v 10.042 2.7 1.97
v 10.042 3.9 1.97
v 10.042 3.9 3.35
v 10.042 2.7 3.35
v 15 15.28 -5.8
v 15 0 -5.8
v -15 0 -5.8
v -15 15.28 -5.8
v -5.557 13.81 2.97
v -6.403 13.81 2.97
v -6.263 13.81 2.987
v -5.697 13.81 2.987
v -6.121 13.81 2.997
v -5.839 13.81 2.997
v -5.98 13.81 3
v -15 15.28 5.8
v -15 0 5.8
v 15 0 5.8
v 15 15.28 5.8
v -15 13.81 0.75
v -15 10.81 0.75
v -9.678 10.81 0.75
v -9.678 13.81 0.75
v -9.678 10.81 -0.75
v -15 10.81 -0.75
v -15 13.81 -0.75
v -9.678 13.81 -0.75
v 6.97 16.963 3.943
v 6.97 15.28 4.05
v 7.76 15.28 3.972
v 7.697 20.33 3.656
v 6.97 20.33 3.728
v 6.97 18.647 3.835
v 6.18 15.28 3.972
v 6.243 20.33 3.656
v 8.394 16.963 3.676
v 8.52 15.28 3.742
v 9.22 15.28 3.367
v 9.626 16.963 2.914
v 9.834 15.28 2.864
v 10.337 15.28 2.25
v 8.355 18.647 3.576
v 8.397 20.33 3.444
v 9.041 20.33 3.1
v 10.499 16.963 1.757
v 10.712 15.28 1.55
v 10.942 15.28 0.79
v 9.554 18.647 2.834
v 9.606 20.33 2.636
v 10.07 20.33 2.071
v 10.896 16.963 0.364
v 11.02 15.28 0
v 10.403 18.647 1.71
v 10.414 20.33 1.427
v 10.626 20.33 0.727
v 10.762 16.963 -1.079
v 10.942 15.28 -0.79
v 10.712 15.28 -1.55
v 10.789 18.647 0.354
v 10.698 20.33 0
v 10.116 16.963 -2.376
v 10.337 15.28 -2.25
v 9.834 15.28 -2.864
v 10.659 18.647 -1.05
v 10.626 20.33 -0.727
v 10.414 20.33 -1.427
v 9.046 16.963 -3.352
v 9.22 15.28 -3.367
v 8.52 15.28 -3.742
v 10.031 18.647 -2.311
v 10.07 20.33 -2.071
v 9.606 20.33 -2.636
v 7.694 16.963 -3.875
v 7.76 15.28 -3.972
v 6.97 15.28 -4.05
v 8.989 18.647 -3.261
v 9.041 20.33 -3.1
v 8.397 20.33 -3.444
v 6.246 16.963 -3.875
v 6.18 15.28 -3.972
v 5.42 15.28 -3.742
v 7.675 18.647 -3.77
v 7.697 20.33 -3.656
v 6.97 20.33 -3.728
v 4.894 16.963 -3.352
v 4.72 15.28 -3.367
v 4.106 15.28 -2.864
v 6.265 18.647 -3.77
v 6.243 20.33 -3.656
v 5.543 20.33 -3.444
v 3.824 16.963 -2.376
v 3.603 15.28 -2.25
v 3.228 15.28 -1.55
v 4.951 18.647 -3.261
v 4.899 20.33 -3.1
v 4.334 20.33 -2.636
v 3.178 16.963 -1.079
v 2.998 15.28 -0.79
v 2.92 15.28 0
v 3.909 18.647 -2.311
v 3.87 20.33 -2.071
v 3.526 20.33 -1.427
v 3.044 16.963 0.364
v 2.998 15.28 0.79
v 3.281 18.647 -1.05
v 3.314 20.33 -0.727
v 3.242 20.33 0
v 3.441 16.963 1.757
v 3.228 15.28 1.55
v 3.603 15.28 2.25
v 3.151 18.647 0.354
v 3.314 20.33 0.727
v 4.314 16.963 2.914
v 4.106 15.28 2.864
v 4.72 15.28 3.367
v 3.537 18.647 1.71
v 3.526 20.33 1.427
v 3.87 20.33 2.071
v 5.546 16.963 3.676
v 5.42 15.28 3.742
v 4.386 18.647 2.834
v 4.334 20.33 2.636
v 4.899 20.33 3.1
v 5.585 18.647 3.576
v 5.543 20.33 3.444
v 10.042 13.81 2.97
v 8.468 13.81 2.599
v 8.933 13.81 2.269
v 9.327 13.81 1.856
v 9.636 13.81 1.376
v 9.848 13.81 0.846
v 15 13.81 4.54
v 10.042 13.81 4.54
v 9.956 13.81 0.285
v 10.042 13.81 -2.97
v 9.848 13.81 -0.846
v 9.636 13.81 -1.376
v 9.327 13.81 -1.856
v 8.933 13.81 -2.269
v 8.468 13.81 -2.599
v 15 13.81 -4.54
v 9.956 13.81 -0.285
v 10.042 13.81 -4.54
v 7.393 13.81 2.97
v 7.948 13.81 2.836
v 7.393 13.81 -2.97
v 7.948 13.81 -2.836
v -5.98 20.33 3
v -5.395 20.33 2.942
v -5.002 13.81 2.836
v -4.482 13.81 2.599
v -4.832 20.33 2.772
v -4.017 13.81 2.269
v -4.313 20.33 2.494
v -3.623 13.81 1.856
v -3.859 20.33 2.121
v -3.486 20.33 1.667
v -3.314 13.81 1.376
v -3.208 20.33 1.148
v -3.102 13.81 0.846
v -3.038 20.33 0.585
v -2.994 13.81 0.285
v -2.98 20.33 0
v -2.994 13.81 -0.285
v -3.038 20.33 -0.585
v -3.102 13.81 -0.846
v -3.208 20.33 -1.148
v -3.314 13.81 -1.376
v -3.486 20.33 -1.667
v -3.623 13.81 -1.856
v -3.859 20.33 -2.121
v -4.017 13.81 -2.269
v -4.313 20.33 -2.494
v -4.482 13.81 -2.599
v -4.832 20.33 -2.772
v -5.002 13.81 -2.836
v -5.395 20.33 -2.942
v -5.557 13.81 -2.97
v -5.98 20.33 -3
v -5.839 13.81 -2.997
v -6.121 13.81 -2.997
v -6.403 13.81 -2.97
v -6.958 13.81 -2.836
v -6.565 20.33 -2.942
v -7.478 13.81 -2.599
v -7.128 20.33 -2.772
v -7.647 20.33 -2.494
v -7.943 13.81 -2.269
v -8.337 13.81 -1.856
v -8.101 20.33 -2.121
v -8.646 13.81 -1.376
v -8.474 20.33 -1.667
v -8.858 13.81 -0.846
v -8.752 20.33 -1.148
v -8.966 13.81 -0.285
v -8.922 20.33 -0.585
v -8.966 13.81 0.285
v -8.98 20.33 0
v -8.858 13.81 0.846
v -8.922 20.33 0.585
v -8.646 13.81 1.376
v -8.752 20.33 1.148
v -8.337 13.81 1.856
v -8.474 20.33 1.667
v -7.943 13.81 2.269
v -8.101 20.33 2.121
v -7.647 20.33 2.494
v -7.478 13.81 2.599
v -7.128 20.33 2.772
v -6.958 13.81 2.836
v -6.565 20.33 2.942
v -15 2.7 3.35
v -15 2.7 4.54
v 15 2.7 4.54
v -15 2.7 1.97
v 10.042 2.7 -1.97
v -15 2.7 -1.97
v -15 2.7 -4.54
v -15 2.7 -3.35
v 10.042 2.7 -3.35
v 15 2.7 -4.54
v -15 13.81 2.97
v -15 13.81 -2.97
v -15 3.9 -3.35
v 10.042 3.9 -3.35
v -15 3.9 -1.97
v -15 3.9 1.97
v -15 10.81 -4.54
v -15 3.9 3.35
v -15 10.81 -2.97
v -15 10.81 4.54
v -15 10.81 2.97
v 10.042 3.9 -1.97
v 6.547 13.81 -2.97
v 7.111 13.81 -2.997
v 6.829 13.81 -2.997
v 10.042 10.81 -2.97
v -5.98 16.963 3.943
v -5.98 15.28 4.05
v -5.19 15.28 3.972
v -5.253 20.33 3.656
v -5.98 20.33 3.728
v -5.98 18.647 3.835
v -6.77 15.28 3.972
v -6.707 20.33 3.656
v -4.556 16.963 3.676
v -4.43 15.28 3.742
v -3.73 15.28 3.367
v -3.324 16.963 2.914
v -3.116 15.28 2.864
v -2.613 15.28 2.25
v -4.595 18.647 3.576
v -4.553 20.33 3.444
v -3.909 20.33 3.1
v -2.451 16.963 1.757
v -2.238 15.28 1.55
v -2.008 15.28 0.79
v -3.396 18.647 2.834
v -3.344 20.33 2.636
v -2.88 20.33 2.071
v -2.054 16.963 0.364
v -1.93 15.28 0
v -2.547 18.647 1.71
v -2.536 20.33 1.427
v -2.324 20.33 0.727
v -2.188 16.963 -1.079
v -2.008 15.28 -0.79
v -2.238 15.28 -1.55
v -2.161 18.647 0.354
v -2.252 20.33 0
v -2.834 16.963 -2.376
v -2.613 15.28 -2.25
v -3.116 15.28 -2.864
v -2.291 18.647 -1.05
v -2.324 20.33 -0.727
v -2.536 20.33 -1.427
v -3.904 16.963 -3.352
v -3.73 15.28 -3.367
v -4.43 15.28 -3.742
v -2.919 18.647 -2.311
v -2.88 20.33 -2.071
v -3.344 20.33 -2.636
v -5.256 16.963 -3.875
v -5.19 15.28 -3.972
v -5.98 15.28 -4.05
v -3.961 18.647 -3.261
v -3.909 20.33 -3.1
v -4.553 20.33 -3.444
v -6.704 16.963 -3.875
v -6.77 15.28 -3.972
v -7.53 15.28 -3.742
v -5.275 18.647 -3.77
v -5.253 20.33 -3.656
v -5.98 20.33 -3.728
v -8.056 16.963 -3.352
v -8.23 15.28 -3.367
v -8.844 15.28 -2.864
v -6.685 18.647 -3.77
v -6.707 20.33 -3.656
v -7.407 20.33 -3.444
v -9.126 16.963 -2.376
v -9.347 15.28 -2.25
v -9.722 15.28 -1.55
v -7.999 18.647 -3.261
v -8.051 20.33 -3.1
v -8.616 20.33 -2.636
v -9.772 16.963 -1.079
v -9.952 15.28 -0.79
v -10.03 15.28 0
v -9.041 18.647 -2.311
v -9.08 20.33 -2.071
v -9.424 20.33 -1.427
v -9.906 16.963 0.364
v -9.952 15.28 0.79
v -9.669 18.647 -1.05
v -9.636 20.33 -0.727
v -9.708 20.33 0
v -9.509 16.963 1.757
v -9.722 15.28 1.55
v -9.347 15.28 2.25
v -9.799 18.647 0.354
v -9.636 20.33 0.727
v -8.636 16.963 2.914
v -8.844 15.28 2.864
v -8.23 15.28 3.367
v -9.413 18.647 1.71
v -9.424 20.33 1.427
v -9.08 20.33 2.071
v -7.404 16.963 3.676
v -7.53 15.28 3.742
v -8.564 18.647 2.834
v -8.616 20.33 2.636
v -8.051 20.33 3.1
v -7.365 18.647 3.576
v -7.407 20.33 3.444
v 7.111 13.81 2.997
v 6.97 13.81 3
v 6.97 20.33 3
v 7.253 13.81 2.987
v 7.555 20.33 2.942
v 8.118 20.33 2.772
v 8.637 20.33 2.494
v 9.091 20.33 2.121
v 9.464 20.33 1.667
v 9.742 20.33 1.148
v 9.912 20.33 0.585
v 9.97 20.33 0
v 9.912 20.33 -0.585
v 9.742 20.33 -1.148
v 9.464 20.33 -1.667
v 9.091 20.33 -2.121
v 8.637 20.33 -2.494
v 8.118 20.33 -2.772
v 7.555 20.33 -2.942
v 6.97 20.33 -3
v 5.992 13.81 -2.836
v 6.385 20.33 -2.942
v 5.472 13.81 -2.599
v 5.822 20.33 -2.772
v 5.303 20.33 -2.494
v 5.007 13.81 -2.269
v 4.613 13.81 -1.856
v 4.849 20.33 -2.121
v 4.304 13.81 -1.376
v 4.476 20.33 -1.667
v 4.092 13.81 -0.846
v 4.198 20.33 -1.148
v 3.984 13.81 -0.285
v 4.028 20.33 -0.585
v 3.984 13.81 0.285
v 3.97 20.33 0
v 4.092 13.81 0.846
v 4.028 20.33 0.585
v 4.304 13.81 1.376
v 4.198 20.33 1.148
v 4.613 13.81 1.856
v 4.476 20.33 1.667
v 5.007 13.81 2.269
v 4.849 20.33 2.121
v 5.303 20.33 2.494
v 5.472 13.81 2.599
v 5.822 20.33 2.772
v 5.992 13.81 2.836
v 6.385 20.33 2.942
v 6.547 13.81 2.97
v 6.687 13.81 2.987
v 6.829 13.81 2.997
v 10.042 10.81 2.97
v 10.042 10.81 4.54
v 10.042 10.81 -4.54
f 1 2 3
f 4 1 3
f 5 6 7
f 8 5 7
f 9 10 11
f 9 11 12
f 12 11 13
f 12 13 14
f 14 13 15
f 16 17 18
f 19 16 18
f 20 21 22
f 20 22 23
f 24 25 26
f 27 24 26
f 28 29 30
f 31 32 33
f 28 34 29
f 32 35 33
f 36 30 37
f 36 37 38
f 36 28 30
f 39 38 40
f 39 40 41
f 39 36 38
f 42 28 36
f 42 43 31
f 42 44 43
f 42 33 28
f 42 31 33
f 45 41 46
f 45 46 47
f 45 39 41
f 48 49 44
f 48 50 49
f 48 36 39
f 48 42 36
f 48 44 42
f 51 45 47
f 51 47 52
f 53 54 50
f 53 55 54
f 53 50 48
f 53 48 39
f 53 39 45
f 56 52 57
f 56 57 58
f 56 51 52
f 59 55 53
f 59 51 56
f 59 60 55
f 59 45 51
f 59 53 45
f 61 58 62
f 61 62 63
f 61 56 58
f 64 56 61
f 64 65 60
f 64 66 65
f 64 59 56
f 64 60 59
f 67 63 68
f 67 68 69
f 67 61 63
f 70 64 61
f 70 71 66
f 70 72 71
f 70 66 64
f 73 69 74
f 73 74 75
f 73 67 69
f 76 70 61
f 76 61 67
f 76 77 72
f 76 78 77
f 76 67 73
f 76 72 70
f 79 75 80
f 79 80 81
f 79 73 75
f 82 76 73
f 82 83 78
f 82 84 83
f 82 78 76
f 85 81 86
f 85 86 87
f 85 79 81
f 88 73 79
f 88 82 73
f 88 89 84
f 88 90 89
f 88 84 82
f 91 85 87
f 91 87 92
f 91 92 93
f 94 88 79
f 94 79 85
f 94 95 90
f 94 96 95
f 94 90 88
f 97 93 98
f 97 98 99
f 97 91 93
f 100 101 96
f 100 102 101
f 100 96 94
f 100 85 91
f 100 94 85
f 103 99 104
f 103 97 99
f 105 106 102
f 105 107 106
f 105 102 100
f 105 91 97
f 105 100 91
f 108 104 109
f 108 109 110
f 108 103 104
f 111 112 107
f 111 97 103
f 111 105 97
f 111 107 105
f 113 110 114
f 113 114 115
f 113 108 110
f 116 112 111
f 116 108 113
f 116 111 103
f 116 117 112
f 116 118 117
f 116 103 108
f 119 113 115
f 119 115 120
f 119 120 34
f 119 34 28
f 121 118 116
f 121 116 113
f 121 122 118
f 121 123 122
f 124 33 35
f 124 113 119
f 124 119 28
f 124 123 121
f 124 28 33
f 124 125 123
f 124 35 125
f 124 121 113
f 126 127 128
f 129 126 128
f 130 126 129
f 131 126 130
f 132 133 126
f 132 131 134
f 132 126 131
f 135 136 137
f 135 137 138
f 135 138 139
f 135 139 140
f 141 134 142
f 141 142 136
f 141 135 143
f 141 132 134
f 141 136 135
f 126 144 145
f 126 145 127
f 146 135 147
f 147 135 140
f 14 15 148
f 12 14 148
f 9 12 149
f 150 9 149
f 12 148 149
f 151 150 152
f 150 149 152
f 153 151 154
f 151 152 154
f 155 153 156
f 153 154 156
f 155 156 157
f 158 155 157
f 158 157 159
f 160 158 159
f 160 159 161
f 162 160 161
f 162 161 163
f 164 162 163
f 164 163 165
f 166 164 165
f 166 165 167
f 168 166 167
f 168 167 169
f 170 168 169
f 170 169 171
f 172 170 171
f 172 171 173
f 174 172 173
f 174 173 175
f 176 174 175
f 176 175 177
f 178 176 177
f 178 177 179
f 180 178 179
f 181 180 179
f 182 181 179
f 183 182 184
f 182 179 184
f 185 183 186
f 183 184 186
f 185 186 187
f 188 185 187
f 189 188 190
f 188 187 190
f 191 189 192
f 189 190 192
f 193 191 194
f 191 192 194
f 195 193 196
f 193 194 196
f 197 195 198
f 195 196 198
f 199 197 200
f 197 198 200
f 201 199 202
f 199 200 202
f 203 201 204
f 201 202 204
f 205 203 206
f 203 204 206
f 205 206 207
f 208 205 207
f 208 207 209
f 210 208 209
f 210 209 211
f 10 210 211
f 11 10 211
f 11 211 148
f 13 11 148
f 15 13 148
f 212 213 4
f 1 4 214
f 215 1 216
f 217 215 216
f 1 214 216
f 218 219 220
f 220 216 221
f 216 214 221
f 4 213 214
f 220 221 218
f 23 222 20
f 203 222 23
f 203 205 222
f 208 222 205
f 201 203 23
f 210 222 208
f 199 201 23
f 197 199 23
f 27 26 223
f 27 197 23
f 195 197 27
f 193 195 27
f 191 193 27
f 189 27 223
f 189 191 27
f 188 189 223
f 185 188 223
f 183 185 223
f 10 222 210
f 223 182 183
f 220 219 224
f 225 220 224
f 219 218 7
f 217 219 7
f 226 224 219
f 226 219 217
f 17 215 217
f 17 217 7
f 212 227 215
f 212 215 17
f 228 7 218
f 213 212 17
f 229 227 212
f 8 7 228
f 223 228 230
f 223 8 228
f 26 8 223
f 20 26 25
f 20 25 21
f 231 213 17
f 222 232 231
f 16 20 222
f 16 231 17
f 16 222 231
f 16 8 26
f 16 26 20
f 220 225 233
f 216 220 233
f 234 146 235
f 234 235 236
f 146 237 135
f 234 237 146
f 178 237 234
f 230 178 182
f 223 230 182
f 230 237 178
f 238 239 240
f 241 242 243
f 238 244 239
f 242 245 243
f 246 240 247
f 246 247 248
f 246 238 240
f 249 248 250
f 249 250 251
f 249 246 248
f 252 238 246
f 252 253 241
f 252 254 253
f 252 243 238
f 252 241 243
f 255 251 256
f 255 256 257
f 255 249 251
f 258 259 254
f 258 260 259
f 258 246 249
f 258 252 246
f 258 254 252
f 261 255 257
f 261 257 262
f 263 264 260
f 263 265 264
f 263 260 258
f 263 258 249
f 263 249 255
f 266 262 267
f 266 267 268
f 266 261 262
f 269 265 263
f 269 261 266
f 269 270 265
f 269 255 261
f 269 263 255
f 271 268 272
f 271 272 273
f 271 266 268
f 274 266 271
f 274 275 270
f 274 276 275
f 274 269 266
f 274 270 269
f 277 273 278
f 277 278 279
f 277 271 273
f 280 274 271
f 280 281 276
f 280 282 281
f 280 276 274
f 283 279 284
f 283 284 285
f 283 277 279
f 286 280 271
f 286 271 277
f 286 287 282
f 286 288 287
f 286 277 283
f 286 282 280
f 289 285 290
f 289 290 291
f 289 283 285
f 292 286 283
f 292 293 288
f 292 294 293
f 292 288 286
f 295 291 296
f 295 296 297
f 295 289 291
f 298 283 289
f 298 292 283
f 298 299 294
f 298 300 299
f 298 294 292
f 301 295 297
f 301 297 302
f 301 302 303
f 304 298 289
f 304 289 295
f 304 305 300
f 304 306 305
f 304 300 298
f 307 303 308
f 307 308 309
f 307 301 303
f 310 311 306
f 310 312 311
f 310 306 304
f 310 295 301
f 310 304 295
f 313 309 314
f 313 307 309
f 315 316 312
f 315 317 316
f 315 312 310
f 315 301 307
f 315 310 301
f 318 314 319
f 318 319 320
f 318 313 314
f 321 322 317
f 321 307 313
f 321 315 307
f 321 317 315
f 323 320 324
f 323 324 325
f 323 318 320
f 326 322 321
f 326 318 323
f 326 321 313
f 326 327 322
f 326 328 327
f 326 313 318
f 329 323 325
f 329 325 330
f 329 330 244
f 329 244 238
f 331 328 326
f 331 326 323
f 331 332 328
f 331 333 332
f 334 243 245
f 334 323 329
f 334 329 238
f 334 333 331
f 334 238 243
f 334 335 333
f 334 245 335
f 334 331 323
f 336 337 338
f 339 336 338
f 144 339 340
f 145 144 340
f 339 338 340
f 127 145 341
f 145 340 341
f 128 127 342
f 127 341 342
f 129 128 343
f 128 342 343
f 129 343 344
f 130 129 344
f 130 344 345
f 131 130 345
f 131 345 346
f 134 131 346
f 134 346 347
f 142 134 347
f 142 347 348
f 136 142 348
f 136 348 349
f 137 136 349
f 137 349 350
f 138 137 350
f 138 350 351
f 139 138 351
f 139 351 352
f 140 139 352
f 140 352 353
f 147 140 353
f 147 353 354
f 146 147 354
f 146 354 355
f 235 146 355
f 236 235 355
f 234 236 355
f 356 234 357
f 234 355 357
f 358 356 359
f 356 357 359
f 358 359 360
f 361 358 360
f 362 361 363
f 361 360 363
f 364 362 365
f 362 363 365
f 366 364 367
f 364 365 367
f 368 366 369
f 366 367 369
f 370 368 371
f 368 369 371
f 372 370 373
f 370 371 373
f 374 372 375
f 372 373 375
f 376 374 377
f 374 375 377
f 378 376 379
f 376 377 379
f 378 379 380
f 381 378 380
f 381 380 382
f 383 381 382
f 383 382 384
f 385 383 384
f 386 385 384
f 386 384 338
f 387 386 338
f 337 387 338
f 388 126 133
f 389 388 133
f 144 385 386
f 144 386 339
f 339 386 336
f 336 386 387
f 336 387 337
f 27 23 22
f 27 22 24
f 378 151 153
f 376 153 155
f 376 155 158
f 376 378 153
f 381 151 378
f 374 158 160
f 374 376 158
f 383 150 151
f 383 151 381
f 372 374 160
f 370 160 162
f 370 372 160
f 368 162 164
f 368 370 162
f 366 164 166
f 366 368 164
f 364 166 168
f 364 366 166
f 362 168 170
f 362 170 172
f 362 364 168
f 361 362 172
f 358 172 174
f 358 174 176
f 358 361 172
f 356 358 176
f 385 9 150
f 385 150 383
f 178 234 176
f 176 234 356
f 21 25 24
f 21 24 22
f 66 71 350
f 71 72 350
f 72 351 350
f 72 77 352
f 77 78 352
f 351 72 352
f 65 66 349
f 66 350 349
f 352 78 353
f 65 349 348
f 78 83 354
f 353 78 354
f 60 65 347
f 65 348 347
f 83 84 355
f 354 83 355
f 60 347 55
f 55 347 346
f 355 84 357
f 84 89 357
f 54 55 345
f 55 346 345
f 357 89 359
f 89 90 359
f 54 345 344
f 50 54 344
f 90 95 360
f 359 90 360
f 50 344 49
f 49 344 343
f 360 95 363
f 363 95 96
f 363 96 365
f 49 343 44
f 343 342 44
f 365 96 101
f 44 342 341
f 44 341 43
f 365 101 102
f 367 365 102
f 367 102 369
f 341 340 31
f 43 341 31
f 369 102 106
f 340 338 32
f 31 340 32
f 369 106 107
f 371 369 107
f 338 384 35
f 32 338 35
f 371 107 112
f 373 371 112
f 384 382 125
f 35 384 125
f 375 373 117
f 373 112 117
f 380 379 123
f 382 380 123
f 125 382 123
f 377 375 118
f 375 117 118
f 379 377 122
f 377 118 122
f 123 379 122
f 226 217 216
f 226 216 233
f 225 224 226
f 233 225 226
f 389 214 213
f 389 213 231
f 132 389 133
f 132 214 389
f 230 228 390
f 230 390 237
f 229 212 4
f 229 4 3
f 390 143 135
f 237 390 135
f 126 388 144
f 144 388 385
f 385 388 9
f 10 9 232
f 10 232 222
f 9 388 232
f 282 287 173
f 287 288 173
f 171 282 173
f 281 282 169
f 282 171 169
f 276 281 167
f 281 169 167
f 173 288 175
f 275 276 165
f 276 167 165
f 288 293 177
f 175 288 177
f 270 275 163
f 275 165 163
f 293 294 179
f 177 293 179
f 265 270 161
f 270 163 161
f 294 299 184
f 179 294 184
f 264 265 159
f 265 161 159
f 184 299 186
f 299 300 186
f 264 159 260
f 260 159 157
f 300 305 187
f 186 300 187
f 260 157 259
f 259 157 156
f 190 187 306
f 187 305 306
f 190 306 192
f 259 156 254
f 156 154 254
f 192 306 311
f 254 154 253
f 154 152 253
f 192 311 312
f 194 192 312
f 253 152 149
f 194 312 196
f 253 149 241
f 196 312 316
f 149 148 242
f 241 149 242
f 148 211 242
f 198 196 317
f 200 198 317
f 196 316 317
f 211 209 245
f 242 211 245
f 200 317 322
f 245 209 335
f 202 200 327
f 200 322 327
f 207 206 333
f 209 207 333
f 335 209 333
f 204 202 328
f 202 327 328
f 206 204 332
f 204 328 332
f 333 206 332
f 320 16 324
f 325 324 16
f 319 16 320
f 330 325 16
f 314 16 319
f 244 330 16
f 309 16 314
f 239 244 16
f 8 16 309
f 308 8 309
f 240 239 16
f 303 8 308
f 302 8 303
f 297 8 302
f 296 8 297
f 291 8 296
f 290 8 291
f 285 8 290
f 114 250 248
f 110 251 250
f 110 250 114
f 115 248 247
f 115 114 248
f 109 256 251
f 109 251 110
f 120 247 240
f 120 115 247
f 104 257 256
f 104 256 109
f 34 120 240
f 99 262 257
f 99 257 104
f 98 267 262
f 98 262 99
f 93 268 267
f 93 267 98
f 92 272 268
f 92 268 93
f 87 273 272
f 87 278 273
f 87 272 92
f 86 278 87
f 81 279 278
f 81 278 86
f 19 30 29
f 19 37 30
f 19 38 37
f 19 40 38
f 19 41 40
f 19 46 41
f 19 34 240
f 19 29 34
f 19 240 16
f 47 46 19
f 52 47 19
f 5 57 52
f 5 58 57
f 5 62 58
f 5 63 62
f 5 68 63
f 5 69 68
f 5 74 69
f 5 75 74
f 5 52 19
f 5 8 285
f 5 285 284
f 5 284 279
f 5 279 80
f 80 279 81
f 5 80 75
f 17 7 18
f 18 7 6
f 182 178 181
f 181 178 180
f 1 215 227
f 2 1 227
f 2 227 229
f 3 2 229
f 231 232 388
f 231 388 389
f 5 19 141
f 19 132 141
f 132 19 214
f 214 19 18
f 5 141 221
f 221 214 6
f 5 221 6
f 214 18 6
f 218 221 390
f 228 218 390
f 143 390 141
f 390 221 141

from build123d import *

# Parameters (mm, degrees)
BOSS_EXTRUDE1_DEPTH = 15.28
SKETCH2_R           = 4.05
BOSS_EXTRUDE2_DEPTH = 9.72
CHAMFER1_SIZE       = 9.72
CHAMFER1_SIZE_2     = 0.62
CHAMFER2_SIZE       = 9.72
CHAMFER2_SIZE_2     = 0.62
SKETCH4_W           = 9.08
SKETCH4_H           = 11.11
CUT_EXTRUDE1_DEPTH  = 30
SKETCH6_W           = 1.5
SKETCH6_H           = 3
SKETCH6_W_2         = 1.57
SKETCH6_W_3         = 1.38
SKETCH6_H_2         = 1.2
BOSS_EXTRUDE3_DEPTH = 25.04233017
SKETCH7_W           = 1.5
SKETCH7_H           = 3
CUT_EXTRUDE2_DEPTH  = 19.72
SKETCH8_R           = 3
CUT_EXTRUDE3_DEPTH  = 11.19
SKETCH9_W           = 11.6
SKETCH9_H           = 4.67
CUT_EXTRUDE4_DEPTH  = 32


with BuildPart() as part:
    # Sketch1 → Boss-Extrude1 (new body)
    with BuildSketch(Plane(origin=(0, 0, 0), x_dir=(1, 0, 0), z_dir=(0, 1, 0))):
        Polygon((-3.25, 5.8), (-15, 5.8), (-15, -5.8), (15, -5.8), (15, 5.8), (3.25, 5.8), align=None)
    extrude(amount=BOSS_EXTRUDE1_DEPTH)

    # Sketch2 → Boss-Extrude2 (add)
    with BuildSketch(Plane(origin=(0, 15.28, 0), x_dir=(1, 0, 0), z_dir=(0, 1, 0))):
        with Locations(Location((-5.98, 0, 0), (0, 0, 270))):
            Circle(SKETCH2_R)
        with Locations(Location((6.97, 0, 0), (0, 0, 270))):
            Circle(SKETCH2_R)
    extrude(amount=BOSS_EXTRUDE2_DEPTH)

    # Chamfer1
    # the kernel refuses this chamfer: 9.72, 0.62 mm, written as the material it takes off along each edge
    with BuildSketch(Plane(origin=(-5.98, 25, 0), x_dir=(0, 0, 1), z_dir=(-1, 0, 0))) as chamfer1_piece_1_section:
        Polygon((4.05, -CHAMFER1_SIZE), (4.05 - CHAMFER1_SIZE_2, 0), (4.05, 0), align=None)
    chamfer1_piece_1 = revolve(axis=Axis((-5.98, 25, 0), (0, 1, 0)), mode=Mode.PRIVATE)
    chamfer1_piece_1 = split(chamfer1_piece_1, bisect_by=Plane(origin=(-5.98, 15.28, -3.777775081), z_dir=(0, 1, 0)), keep=Keep.TOP, mode=Mode.PRIVATE)
    add(chamfer1_piece_1, mode=Mode.SUBTRACT)

    # Chamfer2
    # the kernel refuses this chamfer: 9.72, 0.62 mm, written as the material it takes off along each edge
    with BuildSketch(Plane(origin=(6.97, 25, 0), x_dir=(0, 0, 1), z_dir=(-1, 0, 0))) as chamfer2_piece_1_section:
        Polygon((4.05, -CHAMFER2_SIZE), (4.05 - CHAMFER2_SIZE_2, 0), (4.05, 0), align=None)
    chamfer2_piece_1 = revolve(axis=Axis((6.97, 25, 0), (0, 1, 0)), mode=Mode.PRIVATE)
    chamfer2_piece_1 = split(chamfer2_piece_1, bisect_by=Plane(origin=(6.97, 15.28, -3.777775081), z_dir=(0, 1, 0)), keep=Keep.TOP, mode=Mode.PRIVATE)
    add(chamfer2_piece_1, mode=Mode.SUBTRACT)

    # Sketch4 → Cut-Extrude1 (cut)
    with BuildSketch(Plane(origin=(15, 0, 0), x_dir=(0, 0, -1), z_dir=(1, 0, 0))):
        with Locations((0, 8.255)):
            Rectangle(SKETCH4_W, SKETCH4_H)
    extrude(amount=-CUT_EXTRUDE1_DEPTH, mode=Mode.SUBTRACT)

    # Sketch6 → Boss-Extrude3 (add)
    with BuildSketch(Plane.ZY.offset(15)):
        with Locations((0, 12.31)):
            Rectangle(SKETCH6_W, SKETCH6_H)
        with Locations((-3.755, 12.31)):
            Rectangle(SKETCH6_W_2, SKETCH6_H)
        with Locations((-2.66, 3.3)):
            Rectangle(SKETCH6_W_3, SKETCH6_H_2)
        with Locations((2.66, 3.3)):
            Rectangle(SKETCH6_W_3, SKETCH6_H_2)
        with Locations((3.755, 12.31)):
            Rectangle(SKETCH6_W_2, SKETCH6_H)
    extrude(amount=-BOSS_EXTRUDE3_DEPTH)

    # Sketch7 → Cut-Extrude2 (cut)
    with BuildSketch(Plane(origin=(10.04233017, 0, 0), x_dir=(0, 0, -1), z_dir=(1, 0, 0))):
        with Locations((0, 12.31)):
            Rectangle(SKETCH7_W, SKETCH7_H)
    extrude(amount=-CUT_EXTRUDE2_DEPTH, mode=Mode.SUBTRACT)

    # Sketch8 → Cut-Extrude3 (cut)
    with BuildSketch(Plane(origin=(0, 25, 0), x_dir=(1, 0, 0), z_dir=(0, 1, 0))):
        with Locations(Location((6.97, 0, 0), (0, 0, 270))):
            Circle(SKETCH8_R)
        with Locations(Location((-5.98, 0, 0), (0, 0, 270))):
            Circle(SKETCH8_R)
    extrude(amount=-CUT_EXTRUDE3_DEPTH, mode=Mode.SUBTRACT)

    # Sketch9 → Cut-Extrude4 (cut)
    with BuildSketch(Plane.ZY.offset(15)):
        with Locations((0, 22.665)):
            Rectangle(SKETCH9_W, SKETCH9_H)
    extrude(amount=-CUT_EXTRUDE4_DEPTH, mode=Mode.SUBTRACT)


solid = part.part
